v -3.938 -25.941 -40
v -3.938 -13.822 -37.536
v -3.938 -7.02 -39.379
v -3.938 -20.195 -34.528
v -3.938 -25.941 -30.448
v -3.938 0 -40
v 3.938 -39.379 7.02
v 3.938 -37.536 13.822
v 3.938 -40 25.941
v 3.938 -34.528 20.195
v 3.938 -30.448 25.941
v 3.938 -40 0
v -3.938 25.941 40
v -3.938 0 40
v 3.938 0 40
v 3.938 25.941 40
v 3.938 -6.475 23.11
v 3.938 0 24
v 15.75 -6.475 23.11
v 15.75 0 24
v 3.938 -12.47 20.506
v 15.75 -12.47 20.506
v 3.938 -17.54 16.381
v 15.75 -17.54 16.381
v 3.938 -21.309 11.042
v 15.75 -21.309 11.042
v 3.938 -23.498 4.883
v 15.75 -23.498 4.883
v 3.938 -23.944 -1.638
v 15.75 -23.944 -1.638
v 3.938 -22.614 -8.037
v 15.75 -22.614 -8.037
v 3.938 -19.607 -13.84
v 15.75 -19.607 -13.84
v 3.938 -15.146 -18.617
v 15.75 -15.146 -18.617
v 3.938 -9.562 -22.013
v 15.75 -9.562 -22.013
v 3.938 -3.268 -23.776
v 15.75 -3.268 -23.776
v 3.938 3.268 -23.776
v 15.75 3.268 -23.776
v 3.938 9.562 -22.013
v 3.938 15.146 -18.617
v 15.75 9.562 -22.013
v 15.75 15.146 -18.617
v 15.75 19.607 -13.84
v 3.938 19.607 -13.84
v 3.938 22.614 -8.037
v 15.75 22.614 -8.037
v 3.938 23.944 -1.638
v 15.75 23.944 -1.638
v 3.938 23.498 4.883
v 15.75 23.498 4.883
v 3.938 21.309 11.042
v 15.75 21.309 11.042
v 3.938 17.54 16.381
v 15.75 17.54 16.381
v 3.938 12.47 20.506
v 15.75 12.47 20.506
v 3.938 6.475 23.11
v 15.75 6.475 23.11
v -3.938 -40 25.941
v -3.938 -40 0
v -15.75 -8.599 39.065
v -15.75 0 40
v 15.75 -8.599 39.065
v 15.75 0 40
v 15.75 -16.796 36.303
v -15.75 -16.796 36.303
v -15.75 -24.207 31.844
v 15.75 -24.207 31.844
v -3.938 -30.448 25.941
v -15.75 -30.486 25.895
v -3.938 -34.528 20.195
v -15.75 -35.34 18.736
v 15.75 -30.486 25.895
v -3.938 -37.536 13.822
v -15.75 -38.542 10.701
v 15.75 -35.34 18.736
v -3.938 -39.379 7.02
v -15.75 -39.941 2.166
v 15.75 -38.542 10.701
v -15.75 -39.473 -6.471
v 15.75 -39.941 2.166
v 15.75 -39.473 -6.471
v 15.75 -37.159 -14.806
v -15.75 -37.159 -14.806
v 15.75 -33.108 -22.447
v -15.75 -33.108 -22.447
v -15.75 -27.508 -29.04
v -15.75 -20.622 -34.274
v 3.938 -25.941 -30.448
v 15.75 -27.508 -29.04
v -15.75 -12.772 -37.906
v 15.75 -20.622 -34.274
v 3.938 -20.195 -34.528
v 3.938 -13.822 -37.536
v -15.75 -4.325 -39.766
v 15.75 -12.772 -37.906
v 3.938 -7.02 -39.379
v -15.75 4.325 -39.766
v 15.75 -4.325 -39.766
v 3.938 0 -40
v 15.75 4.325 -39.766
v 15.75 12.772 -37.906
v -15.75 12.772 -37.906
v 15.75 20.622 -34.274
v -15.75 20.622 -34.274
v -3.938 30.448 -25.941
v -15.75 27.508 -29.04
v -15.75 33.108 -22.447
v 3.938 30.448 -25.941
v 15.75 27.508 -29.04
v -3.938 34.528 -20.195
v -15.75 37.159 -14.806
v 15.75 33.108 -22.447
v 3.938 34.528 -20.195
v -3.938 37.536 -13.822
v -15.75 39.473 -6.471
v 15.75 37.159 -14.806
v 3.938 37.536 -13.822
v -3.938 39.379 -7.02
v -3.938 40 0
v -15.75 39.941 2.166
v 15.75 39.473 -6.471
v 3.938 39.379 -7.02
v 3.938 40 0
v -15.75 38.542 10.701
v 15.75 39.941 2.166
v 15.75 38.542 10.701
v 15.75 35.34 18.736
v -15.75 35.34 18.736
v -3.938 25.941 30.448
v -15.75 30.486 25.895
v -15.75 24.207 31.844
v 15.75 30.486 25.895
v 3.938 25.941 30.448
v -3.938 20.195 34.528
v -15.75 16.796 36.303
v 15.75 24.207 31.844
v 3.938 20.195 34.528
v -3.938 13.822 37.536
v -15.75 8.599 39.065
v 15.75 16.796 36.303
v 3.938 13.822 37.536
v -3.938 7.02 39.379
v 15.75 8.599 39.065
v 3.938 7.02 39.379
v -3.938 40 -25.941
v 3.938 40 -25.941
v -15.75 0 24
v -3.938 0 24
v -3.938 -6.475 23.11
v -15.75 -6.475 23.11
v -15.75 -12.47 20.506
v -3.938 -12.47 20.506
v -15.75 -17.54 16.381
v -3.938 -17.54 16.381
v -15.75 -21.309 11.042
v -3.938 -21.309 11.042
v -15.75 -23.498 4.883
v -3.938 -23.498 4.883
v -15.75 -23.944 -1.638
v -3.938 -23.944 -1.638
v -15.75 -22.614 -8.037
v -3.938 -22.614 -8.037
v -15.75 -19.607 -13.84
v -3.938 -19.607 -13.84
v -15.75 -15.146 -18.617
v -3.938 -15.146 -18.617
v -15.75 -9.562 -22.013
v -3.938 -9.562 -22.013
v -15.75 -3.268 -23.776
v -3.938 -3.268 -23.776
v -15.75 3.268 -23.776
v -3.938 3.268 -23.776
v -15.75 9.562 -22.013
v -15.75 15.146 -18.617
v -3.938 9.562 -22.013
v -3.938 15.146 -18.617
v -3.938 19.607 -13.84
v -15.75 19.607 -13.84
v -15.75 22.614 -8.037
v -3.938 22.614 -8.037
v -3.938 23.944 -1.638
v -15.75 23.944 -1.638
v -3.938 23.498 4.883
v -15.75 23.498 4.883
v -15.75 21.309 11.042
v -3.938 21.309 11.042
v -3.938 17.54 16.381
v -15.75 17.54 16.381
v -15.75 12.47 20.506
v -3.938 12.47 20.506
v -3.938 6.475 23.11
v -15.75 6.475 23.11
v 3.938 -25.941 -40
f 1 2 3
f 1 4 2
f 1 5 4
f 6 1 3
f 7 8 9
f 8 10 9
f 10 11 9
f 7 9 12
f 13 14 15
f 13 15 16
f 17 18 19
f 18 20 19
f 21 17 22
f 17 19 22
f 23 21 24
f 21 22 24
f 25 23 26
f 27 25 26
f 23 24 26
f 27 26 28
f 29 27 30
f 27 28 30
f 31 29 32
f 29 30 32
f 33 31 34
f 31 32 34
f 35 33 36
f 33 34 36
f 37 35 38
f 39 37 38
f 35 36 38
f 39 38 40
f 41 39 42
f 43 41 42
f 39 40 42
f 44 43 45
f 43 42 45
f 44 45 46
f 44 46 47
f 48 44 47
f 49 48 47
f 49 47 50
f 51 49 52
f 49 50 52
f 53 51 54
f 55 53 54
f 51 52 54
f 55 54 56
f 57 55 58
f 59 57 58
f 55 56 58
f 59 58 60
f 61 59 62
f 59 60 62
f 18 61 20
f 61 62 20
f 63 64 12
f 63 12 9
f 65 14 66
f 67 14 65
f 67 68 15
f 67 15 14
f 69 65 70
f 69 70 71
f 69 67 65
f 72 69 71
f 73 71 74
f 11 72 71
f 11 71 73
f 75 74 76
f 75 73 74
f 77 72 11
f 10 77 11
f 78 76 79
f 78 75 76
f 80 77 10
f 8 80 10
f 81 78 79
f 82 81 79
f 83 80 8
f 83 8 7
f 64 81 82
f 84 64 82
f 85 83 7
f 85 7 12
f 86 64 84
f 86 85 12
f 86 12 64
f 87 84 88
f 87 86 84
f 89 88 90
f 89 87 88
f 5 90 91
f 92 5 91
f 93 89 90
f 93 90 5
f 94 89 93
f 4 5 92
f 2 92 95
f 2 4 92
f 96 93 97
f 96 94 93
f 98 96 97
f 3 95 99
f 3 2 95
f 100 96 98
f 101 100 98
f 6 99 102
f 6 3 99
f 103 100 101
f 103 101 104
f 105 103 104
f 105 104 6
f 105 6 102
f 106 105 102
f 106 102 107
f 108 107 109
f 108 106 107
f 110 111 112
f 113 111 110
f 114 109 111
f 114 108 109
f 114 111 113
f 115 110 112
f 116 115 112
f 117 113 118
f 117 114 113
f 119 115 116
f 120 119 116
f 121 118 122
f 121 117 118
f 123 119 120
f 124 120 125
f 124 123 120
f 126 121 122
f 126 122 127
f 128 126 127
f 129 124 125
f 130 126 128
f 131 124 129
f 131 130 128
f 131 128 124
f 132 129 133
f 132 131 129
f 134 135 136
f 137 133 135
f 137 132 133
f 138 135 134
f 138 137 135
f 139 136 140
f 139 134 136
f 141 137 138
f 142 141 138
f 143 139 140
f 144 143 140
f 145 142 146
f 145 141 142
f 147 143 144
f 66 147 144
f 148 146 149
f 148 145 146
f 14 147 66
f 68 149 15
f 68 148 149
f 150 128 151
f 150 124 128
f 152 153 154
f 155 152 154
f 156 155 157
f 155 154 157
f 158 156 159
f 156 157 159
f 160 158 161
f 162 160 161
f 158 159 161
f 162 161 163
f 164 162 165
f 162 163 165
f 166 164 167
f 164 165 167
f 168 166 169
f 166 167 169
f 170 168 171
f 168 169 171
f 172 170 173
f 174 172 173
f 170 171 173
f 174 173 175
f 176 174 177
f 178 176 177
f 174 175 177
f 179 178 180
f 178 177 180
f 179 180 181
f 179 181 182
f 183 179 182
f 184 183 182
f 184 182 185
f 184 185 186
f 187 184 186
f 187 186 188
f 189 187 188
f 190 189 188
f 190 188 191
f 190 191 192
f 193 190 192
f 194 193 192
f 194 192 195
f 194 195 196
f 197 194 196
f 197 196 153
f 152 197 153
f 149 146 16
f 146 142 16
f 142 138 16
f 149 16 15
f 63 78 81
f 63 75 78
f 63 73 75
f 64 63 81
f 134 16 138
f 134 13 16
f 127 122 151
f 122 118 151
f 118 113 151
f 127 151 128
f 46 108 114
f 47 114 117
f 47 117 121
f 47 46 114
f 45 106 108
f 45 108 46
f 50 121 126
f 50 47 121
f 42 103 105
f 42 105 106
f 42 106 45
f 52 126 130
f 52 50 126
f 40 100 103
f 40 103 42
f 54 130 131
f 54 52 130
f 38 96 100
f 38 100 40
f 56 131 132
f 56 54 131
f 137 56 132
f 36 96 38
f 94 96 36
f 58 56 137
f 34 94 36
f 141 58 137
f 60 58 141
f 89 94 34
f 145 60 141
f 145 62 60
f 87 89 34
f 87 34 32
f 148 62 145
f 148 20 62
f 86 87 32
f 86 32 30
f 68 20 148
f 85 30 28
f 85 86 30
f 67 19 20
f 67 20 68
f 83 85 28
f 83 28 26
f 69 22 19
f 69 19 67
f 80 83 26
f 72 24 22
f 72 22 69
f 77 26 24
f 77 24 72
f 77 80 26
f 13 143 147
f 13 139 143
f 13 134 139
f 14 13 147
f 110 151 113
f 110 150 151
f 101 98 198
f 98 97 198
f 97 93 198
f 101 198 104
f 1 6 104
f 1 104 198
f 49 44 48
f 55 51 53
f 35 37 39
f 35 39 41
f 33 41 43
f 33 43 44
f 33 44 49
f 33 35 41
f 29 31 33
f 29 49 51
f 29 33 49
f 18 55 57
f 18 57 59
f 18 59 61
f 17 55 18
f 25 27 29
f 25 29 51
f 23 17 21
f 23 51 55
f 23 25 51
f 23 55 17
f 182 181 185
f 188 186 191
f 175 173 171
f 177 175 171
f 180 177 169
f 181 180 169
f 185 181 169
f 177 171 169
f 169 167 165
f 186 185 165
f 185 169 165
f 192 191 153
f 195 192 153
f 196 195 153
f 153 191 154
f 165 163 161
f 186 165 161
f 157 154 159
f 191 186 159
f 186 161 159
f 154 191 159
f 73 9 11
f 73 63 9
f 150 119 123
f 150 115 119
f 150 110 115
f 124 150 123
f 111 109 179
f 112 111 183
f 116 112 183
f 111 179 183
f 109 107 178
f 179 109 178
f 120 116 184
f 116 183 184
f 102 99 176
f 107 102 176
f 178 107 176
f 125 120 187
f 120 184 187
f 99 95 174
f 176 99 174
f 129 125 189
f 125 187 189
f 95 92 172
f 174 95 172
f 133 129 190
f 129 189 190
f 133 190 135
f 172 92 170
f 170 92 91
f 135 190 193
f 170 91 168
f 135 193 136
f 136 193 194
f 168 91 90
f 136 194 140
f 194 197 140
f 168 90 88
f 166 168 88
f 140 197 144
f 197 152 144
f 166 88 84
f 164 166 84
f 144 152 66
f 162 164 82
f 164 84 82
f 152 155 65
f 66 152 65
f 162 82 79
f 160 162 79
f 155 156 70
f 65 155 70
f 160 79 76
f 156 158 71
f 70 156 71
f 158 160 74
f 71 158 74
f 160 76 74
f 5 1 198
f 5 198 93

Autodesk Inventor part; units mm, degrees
ref_plane "YZ Plane" through (0, 0, 0) normal (1, 0, 0) x (0, 1, 0)
ref_plane "XZ Plane" through (0, 0, 0) normal (0, 1, 0) x (-1, 0, 0)
ref_plane "XY Plane" through (0, 0, 0) normal (0, 0, 1) x (1, 0, 0)
sketch "Sketch1" plane through (0, 0, 0) normal (0, 1, 0) x (-1, 0, 0)
  line L0 (15.75, 0) -> (-15.75, 0) construction
  line L1 (15.75, 40) -> (-15.75, 40)
  line L2 (-15.75, 40) -> (-15.75, 24)
  line L3 (15.75, 24) -> (-15.75, 24)
  line L4 (15.75, 24) -> (15.75, 40)
  line L5 (3.9375, 0) -> (-3.9375, 0)
  line L6 (-3.9375, 0) -> (-3.9375, 24)
  line L7 (-3.9375, 24) -> (3.9375, 24)
  line L8 (3.9375, 24) -> (3.9375, 0)
  line L9 (3.9375, 0) -> (-3.9375, 24) construction
  line L10 (-3.9375, 0) -> (3.9375, 24) construction
  point P0 (0, 12)
  point P1 (0, 24)
  point P2 (0, 0)
  point P3 (0, 0)
  dimension "Thickness" = 31.5
  dimension "DiamExt" = 80
  dimension "PipeDiameter" = 48
  dimension "d8" = 7.875
revolve "Revolution1" add sketch "Sketch1" angle 360 about axis through (-15.75, 0, 0) along (1, 0, 0)
sketch "Sketch5" plane through (-3.9375, 0, 0) normal (-1, 0, 0) x (0, 0, 1)
  circle A0 centre (0, 0) radius 40 projected
  line L0 (0, 0) -> (33.9411, 33.9411) construction
  line L1 (0, 0) -> (48, 0) construction
  circle A1 centre (33.9411, 33.9411) radius 8 construction
  circle A2 centre (0, 0) radius 40 projected
  line L2 (40, 0) -> (40, 25.9411)
  line L3 (40, 25.9411) -> (30.4476, 25.9411)
  point P0 (0, 0)
  dimension "d18" = 45
  dimension "d19" = 16
extrude "Extrusion1" add sketch "Sketch5" against normal up to surface (7.875 mm away) from surface at 0 contours A0 L3 L2
pattern_circular "Circular Pattern1" count 4 over 360 about axis through (0, 0, 0) along (-1, 0, 0) of "Extrusion1"
equation "\"d8\" = 0.25 * Thickness"
properties part number "CHECK VALVE DISK WAFER 316L DN40" material "304L"
